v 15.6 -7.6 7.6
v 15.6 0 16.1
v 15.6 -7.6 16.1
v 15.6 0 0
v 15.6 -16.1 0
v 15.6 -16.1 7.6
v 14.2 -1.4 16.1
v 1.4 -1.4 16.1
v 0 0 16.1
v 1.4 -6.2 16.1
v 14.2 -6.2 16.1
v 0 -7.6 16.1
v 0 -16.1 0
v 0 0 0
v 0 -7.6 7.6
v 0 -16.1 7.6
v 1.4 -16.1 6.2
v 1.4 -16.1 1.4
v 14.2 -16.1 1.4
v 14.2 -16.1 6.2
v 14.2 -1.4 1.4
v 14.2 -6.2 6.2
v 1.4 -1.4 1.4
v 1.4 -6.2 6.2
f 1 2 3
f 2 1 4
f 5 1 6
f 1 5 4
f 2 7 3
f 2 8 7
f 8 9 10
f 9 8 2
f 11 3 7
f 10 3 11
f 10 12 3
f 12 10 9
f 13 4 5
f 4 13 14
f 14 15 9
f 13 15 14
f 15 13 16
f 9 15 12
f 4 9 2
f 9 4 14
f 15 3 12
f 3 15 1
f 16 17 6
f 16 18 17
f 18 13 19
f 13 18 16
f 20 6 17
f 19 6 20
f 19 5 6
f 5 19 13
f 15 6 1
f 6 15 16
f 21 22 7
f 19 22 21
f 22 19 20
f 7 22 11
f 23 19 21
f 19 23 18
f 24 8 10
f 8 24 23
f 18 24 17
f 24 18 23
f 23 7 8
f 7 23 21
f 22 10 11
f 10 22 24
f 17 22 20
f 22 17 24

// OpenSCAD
// 12.8 x 4.8
a = 12.8;
b = 4.8;
c = 10+b;
p = 1.4; // pad 

difference() {
    ap = a+2*p;
    bp = b+2*p;
    cp = c+p-0.1;
    union(){
    translate([0,-b-2*p,0]) rotate([0,0,0]) cube([ap,bp,cp]);
    translate([0,0,0]) rotate([90,0,0]) cube([ap,bp,cp]);
    }
    
    translate([p,-p,p])
    union(){
    translate([0,-b,0]) rotate([0,0,0]) cube([a,b,c]);
    translate([0,0,0]) rotate([90,0,0]) cube([a,b,c]);
    }

}
